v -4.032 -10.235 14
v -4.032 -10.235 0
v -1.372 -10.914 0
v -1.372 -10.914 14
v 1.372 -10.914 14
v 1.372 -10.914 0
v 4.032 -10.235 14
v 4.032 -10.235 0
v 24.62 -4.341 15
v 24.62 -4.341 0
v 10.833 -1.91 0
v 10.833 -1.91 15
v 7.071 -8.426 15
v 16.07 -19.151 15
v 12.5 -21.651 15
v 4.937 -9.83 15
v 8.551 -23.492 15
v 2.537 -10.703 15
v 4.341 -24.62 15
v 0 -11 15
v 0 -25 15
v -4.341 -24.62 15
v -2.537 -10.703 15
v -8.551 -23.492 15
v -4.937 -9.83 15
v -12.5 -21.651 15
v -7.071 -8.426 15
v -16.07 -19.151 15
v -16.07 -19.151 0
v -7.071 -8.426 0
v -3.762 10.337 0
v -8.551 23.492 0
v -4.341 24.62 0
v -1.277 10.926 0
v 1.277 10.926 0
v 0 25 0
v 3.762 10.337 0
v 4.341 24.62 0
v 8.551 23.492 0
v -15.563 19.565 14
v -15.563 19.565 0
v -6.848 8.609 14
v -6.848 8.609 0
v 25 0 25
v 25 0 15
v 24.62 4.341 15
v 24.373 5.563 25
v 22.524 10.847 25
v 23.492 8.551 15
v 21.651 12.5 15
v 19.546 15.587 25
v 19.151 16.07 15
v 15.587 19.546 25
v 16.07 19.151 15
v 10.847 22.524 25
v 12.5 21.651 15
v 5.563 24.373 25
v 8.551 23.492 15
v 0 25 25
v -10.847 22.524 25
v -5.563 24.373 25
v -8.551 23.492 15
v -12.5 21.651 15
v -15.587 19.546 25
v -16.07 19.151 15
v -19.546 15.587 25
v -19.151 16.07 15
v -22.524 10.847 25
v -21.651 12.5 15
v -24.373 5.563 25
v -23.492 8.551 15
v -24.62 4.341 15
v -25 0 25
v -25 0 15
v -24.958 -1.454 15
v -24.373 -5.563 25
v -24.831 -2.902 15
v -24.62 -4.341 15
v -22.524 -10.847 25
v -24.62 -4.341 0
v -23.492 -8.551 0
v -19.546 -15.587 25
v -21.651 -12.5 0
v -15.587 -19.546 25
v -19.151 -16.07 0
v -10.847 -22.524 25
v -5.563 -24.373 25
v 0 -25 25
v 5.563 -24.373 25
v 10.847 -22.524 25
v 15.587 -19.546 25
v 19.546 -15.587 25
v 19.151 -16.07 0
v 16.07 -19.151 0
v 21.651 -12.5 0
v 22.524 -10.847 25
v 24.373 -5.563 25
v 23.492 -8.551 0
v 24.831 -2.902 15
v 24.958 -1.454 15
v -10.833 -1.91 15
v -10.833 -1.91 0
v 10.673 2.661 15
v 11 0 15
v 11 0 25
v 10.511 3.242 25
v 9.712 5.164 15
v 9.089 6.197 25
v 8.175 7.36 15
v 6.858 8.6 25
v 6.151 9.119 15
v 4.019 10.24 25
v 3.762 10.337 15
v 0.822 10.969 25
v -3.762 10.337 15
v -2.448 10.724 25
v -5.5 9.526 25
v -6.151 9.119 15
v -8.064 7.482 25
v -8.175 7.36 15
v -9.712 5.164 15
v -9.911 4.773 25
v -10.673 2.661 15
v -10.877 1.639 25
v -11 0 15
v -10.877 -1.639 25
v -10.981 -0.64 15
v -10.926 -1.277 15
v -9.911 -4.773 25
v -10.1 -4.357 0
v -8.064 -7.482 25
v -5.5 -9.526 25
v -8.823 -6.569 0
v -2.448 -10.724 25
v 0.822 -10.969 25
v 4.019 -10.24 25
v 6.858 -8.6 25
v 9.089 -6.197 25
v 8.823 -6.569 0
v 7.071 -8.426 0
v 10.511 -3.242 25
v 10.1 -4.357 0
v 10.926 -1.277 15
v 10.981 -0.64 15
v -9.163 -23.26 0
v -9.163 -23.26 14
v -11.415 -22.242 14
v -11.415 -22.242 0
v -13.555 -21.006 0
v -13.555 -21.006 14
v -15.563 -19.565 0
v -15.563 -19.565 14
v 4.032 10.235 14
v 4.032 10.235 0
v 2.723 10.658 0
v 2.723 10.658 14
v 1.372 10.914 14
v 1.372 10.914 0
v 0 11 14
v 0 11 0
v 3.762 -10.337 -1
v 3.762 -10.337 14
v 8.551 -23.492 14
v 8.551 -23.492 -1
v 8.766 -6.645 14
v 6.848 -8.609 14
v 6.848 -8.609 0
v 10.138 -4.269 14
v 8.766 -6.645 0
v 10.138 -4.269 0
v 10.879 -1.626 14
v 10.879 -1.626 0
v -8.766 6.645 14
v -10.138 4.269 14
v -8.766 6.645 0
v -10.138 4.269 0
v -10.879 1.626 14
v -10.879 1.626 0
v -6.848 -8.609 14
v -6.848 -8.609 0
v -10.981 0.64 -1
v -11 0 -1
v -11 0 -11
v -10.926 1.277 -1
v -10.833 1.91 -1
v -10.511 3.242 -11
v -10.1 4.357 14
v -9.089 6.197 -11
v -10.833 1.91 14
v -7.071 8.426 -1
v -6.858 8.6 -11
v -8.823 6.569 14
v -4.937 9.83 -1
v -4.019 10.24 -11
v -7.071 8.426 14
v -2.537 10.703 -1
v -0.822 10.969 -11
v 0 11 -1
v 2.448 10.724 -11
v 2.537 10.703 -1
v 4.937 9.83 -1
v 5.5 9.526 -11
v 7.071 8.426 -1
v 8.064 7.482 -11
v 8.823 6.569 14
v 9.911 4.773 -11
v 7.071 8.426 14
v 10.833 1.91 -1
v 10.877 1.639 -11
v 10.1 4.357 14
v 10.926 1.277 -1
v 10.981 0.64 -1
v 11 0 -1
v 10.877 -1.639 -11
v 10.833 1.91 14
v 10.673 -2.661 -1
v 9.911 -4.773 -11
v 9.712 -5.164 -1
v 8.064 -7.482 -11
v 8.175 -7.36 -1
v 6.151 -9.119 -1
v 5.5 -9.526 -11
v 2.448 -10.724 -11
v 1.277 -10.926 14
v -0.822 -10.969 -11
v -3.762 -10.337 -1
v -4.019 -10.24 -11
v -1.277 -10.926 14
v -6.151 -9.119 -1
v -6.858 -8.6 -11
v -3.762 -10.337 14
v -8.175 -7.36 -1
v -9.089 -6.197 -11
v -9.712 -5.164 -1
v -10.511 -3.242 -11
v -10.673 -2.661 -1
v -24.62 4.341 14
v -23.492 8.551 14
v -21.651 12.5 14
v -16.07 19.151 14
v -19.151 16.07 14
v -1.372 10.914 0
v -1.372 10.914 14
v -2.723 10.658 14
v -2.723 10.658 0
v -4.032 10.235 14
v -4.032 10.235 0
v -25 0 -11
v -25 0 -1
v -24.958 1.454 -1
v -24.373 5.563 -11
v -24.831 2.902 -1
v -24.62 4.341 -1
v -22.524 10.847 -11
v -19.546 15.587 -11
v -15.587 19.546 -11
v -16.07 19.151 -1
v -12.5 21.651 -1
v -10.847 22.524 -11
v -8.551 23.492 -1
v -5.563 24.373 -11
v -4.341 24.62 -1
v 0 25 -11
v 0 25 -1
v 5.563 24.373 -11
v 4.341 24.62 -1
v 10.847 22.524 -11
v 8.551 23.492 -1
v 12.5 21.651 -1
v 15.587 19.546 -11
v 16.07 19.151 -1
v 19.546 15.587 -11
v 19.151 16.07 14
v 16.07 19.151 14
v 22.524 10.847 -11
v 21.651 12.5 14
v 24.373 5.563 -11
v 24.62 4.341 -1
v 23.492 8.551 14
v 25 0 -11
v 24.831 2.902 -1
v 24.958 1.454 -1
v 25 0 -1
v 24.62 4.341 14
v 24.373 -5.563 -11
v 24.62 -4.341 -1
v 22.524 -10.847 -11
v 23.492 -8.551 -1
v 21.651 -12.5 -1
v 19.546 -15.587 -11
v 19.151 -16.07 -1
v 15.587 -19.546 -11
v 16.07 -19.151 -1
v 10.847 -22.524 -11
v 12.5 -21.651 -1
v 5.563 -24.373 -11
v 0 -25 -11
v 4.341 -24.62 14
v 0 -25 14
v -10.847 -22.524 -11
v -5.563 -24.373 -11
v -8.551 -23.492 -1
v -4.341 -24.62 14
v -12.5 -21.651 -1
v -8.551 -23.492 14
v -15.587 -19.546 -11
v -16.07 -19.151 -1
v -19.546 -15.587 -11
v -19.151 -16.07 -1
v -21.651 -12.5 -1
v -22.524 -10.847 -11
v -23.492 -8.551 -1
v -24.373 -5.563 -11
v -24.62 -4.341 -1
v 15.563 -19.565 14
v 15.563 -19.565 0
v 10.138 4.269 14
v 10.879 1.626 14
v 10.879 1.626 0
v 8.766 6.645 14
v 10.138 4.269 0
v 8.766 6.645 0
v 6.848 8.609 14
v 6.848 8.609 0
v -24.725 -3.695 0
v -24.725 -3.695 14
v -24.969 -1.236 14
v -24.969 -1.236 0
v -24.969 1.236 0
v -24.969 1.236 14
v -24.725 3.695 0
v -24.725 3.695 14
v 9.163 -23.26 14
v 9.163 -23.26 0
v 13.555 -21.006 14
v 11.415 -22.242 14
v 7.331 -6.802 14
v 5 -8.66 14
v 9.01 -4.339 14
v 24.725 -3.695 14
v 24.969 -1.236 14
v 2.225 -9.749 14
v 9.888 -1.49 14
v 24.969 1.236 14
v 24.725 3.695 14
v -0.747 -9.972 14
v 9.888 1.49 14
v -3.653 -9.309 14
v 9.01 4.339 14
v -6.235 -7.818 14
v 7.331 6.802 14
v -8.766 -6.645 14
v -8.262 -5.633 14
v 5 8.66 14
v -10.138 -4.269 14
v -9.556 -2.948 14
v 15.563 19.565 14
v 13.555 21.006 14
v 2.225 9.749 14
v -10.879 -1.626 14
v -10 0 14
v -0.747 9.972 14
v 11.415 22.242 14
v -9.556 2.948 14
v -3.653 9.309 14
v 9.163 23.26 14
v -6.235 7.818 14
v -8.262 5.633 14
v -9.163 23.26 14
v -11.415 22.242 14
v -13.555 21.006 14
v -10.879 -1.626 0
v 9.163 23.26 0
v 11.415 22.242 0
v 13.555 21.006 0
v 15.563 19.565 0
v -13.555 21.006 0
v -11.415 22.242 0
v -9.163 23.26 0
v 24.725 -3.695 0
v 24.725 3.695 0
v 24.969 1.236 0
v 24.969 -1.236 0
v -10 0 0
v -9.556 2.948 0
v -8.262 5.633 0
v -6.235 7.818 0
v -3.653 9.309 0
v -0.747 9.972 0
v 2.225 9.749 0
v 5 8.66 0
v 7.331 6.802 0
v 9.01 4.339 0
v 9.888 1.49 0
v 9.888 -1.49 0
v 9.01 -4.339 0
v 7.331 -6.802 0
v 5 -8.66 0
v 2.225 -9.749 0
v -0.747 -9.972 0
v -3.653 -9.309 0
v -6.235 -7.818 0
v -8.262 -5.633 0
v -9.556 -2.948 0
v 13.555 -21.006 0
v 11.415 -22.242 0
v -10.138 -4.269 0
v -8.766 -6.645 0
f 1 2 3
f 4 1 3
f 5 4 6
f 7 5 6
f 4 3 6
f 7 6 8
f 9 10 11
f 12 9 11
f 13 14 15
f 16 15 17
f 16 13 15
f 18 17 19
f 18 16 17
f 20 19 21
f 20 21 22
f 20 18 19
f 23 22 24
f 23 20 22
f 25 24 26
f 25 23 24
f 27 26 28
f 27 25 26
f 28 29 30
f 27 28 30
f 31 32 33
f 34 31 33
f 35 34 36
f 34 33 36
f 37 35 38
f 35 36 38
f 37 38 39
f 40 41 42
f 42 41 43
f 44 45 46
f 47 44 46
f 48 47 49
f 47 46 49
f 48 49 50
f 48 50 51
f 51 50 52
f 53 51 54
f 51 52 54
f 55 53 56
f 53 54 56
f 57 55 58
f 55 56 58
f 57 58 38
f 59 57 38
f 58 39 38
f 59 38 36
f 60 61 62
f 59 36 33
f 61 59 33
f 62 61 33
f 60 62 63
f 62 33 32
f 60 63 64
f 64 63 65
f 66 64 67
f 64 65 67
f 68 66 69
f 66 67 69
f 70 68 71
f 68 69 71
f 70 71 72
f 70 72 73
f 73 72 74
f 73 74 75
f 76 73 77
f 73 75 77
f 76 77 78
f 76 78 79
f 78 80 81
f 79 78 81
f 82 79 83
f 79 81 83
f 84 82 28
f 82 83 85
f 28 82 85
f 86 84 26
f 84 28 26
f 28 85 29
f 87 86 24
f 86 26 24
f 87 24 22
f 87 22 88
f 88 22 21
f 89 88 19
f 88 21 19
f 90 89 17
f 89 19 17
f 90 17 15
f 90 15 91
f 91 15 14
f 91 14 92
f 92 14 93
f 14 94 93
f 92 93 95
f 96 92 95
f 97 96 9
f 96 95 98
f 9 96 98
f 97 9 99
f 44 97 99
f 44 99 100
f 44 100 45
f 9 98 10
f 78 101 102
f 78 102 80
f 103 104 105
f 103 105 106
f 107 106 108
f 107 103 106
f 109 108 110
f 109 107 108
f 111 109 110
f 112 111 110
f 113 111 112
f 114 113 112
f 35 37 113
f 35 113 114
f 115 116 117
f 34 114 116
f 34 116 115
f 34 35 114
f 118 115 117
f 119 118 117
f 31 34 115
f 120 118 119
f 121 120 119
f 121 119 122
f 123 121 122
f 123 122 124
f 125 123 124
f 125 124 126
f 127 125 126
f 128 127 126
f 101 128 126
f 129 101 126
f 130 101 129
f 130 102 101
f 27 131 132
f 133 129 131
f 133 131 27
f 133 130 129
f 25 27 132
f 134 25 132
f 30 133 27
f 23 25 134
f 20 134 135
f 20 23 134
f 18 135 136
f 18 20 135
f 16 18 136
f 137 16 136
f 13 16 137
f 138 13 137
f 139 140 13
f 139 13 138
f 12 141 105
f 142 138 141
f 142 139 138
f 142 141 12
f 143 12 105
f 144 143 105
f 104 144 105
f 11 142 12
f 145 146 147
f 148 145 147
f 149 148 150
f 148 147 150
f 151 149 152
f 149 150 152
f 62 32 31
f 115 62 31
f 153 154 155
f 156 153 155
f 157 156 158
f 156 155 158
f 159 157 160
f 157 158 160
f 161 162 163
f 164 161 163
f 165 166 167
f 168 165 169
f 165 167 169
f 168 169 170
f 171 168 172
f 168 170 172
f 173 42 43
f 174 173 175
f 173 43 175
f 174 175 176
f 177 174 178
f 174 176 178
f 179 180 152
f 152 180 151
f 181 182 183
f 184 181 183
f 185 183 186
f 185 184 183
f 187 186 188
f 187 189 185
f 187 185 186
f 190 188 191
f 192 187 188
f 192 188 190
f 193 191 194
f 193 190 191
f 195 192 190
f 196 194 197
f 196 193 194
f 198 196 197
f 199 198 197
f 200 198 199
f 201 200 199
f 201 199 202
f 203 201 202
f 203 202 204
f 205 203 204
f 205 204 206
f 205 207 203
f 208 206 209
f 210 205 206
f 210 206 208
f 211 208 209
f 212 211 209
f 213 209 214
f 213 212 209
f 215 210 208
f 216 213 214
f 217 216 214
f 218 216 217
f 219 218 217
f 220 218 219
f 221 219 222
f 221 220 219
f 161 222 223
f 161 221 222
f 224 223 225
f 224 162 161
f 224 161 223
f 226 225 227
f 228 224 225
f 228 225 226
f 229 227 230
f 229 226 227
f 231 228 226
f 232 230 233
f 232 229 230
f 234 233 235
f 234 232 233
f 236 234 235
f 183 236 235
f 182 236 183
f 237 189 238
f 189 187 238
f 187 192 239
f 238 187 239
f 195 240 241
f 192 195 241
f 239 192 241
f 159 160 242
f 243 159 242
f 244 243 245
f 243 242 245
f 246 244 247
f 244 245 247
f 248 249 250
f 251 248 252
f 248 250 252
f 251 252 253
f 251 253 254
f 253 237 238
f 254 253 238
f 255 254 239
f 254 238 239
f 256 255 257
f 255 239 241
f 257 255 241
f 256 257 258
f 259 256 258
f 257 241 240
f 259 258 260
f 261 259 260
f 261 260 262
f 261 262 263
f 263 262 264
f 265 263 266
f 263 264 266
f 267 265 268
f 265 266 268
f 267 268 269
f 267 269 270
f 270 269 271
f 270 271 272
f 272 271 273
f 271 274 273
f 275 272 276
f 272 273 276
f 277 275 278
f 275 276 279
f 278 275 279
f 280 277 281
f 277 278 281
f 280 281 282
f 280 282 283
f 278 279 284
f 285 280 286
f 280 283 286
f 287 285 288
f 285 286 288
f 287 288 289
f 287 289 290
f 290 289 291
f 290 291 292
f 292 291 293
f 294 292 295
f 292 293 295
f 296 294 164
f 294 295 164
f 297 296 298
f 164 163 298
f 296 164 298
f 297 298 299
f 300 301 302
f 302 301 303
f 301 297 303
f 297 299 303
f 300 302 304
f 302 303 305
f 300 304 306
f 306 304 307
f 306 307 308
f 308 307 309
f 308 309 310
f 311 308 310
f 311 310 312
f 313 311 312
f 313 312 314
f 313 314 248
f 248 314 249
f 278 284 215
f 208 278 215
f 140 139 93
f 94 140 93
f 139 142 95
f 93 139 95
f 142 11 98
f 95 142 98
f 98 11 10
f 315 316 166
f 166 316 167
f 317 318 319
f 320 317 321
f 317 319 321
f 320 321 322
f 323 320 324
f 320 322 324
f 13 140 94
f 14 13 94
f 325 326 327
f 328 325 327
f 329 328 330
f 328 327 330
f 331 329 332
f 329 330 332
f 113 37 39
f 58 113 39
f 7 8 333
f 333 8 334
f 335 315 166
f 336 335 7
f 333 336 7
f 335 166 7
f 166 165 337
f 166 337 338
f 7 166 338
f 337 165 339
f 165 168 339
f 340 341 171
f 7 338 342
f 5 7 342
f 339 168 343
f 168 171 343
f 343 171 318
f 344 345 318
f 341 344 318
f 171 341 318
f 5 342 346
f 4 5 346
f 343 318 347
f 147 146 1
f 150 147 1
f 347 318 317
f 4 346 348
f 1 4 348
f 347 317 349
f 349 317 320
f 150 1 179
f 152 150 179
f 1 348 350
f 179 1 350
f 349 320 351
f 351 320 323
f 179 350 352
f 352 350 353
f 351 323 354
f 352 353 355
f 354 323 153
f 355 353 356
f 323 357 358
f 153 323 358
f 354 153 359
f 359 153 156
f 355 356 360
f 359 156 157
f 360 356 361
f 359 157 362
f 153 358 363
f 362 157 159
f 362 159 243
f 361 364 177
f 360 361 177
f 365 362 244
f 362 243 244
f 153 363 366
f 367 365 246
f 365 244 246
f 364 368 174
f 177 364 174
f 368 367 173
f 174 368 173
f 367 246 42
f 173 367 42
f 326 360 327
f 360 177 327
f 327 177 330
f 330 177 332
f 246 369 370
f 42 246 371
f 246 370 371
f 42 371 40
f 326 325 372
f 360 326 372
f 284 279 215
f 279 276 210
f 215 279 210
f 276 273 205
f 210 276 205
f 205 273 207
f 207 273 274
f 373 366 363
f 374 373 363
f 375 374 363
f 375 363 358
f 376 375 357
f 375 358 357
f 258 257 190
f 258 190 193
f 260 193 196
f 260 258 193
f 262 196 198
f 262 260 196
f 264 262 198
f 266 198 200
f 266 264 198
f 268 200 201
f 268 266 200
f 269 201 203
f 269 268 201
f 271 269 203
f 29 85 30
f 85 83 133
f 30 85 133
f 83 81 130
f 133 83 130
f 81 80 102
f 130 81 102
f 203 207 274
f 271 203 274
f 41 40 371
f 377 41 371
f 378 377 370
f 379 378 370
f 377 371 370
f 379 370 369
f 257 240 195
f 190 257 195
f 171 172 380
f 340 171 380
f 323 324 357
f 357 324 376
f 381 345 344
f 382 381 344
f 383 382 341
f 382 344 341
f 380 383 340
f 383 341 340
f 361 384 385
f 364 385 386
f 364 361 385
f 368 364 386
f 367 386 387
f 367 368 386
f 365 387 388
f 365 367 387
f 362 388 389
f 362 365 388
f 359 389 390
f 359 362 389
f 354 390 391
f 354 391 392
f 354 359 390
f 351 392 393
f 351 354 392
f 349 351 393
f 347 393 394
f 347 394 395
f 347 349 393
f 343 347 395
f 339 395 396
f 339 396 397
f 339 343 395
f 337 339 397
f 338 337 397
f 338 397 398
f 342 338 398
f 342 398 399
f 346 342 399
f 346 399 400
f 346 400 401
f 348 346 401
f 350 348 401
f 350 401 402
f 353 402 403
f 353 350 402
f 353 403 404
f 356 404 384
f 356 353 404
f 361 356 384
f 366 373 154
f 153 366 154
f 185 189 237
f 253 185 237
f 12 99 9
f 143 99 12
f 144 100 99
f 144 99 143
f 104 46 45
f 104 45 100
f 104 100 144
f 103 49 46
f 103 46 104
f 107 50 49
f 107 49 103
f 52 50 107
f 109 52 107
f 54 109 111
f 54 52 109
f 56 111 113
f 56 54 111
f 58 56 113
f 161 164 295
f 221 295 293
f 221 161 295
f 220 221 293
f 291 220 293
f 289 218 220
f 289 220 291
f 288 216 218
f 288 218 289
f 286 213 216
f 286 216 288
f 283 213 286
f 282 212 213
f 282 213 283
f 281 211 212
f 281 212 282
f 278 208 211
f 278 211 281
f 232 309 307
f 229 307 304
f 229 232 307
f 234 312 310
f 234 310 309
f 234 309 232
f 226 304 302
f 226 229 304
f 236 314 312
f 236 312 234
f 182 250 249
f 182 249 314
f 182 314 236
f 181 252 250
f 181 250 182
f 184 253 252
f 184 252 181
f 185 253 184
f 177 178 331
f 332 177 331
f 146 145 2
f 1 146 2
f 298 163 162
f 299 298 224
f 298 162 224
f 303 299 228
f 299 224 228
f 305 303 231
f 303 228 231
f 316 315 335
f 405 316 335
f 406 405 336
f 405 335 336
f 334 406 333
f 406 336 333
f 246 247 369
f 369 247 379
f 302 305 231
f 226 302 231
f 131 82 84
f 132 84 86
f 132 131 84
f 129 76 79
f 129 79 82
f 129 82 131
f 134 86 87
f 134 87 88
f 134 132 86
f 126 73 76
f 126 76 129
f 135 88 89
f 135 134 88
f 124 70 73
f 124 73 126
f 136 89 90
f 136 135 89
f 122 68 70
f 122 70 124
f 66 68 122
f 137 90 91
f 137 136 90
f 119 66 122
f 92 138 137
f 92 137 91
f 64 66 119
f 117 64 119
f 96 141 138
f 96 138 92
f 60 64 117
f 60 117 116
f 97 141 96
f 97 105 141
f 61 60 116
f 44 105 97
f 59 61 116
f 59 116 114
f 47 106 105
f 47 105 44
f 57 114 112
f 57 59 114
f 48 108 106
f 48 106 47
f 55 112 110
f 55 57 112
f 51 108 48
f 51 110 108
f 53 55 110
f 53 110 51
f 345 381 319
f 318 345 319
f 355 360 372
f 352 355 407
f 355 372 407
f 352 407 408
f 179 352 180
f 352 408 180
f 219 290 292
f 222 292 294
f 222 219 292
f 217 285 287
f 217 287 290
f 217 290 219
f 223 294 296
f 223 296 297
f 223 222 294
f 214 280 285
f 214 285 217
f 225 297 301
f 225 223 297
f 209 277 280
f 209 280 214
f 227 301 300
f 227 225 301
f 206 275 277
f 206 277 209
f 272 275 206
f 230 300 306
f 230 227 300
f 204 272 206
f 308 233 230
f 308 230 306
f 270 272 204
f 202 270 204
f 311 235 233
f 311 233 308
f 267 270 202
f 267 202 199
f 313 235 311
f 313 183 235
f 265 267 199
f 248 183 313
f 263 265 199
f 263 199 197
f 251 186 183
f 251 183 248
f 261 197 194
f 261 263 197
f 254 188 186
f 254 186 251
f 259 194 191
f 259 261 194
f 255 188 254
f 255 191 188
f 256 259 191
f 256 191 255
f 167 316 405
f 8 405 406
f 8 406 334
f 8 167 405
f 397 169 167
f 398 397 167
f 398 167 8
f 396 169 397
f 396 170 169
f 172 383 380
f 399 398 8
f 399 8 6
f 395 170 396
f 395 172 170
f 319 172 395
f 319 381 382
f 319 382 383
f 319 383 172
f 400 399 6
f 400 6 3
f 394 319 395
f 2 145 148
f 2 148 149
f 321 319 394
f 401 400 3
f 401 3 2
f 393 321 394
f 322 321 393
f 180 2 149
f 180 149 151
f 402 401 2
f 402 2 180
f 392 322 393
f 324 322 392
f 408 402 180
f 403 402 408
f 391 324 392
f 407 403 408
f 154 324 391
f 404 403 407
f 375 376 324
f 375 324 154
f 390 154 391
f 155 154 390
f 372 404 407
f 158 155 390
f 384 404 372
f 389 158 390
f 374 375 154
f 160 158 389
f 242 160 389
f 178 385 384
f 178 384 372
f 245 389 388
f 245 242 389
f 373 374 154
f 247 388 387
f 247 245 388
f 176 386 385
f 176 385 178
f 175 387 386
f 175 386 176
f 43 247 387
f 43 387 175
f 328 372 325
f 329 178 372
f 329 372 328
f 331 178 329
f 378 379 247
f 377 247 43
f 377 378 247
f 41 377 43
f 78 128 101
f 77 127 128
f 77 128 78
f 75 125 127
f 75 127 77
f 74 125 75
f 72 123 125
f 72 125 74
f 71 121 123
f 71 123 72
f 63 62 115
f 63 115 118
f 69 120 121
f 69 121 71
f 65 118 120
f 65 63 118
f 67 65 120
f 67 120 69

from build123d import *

# Parameters (mm, degrees)
SKETCH_1_R          = 25
SKETCH_1_R_2        = 11
EXTRUDE_1_DEPTH     = 25
CUT_EXTRUDE_1_DEPTH = 15
SKETCH_3_R          = 25
SKETCH_3_R_2        = 11
EXTRUDE_3_DEPTH     = 25
CUT_EXTRUDE_2_DEPTH = 15
SKETCH_5_R          = 25
SKETCH_5_R_2        = 10
EXTRUDE_5_DEPTH     = 14
CUT_EXTRUDE_5_DEPTH = 14


with BuildPart() as part:
    # 草图1 → 凸台-拉伸1 (new body)
    with BuildSketch(Plane.XY):
        Circle(SKETCH_1_R)
        Circle(SKETCH_1_R_2, mode=Mode.SUBTRACT)
    extrude(amount=EXTRUDE_1_DEPTH)

    # 草图2 → 切除-拉伸1 (cut)
    with BuildSketch(Plane(origin=(0, 0, 0), x_dir=(-1, 0, 0), z_dir=(0, 0, -1))):
        with BuildLine():
            Line((-24.620193825, -4.341204442), (-10.832885283, -1.910129954))
            ThreePointArc((-10.832885283, -1.910129954), (-9.526279442, 5.5), (-3.762221577, 10.336618829))
            Line((-3.762221577, 10.336618829), (-8.550503583, 23.49231552))
            ThreePointArc((-8.550503583, 23.49231552), (-16.069690273, 19.151111052), (-21.650635135, 12.49999993))
            ThreePointArc((-21.650635135, 12.49999993), (-24.620193832, 4.341204402), (-24.620193825, -4.341204442))
        make_face()
        with BuildLine():
            Line((8.550503583, 23.49231552), (3.762221577, 10.336618829))
            ThreePointArc((3.762221577, 10.336618829), (9.010672487, 6.3093408), (11, 0))
            ThreePointArc((11, 0), (10.958141679, -0.95871317), (10.832885283, -1.910129954))
            Line((10.832885283, -1.910129954), (24.620193825, -4.341204442))
            ThreePointArc((24.620193825, -4.341204442), (24.904867452, -2.178893569), (25, 0))
            ThreePointArc((25, 0), (24.148145619, 6.470476269), (21.650634949, 12.500000253))
            ThreePointArc((21.650634949, 12.500000253), (16.06969013, 19.151111172), (8.550503583, 23.49231552))
        make_face()
        with BuildLine():
            ThreePointArc((0, -11), (-3.762221577, -10.336618829), (-7.070663707, -8.426488874))
            Line((-7.070663707, -8.426488874), (-16.069690242, -19.151111078))
            ThreePointArc((-16.069690242, -19.151111078), (-8.550503583, -23.49231552), (0, -25))
            Line((0, -25), (0, -11))
        make_face()
        with BuildLine():
            Line((16.069690242, -19.151111078), (7.070663707, -8.426488874))
            ThreePointArc((7.070663707, -8.426488874), (3.762221577, -10.336618829), (0, -11))
            Line((0, -11), (0, -25))
            ThreePointArc((0, -25), (8.550503583, -23.49231552), (16.069690242, -19.151111078))
        make_face()
    extrude(amount=-CUT_EXTRUDE_1_DEPTH, mode=Mode.SUBTRACT)


with BuildPart() as body_2:
    # 草图3 → 凸台-拉伸3 (new body)
    with BuildSketch(Plane(origin=(0, 0, 14), x_dir=(-1, 0, 0), z_dir=(0, 0, -1))):
        Circle(SKETCH_3_R)
        Circle(SKETCH_3_R_2, mode=Mode.SUBTRACT)
    extrude(amount=EXTRUDE_3_DEPTH)

    # 草图4 → 切除-拉伸2 (cut)
    with BuildSketch(Plane.XY.offset(14)):
        with BuildLine():
            Line((-16.069690242, 19.151111078), (-7.070663707, 8.426488874))
            ThreePointArc((-7.070663707, 8.426488874), (-3.762221577, 10.336618829), (0, 11))
            Line((0, 11), (0, 25))
            ThreePointArc((0, 25), (-8.550503583, 23.49231552), (-16.069690242, 19.151111078))
        make_face()
        with BuildLine():
            ThreePointArc((0, 11), (3.762221577, 10.336618829), (7.070663707, 8.426488874))
            Line((7.070663707, 8.426488874), (16.069690242, 19.151111078))
            ThreePointArc((16.069690242, 19.151111078), (8.550503583, 23.49231552), (0, 25))
            Line((0, 25), (0, 11))
        make_face()
        with BuildLine():
            Line((24.620193825, 4.341204442), (10.832885283, 1.910129954))
            ThreePointArc((10.832885283, 1.910129954), (10.958141679, 0.95871317), (11, 0))
            ThreePointArc((11, 0), (9.010672487, -6.3093408), (3.762221577, -10.336618829))
            Line((3.762221577, -10.336618829), (8.550503583, -23.49231552))
            ThreePointArc((8.550503583, -23.49231552), (16.06969013, -19.151111172), (21.650634948, -12.500000253))
            ThreePointArc((21.650634948, -12.500000253), (24.148145619, -6.470476269), (25, 0))
            ThreePointArc((25, 0), (24.904867452, 2.178893569), (24.620193825, 4.341204442))
        make_face()
        with BuildLine():
            Line((-8.550503583, -23.49231552), (-3.762221577, -10.336618829))
            ThreePointArc((-3.762221577, -10.336618829), (-9.526279442, -5.5), (-10.832885283, 1.910129954))
            Line((-10.832885283, 1.910129954), (-24.620193825, 4.341204442))
            ThreePointArc((-24.620193825, 4.341204442), (-24.620193881, -4.341204125), (-21.650635416, -12.499999443))
            ThreePointArc((-21.650635416, -12.499999443), (-16.069690489, -19.151110871), (-8.550503583, -23.49231552))
        make_face()
    extrude(amount=-CUT_EXTRUDE_2_DEPTH, mode=Mode.SUBTRACT)


with BuildPart() as body_3:
    # 草图5 → 凸台-拉伸5 (new body)
    with BuildSketch(Plane(origin=(0, 0, 14), x_dir=(-1, 0, 0), z_dir=(0, 0, -1))):
        Circle(SKETCH_5_R)
        Circle(SKETCH_5_R_2, mode=Mode.SUBTRACT)
    extrude(amount=EXTRUDE_5_DEPTH)

    # 草图6 → 切除-拉伸5 (cut)
    with BuildSketch(Plane(origin=(0, 0, 0), x_dir=(-1, 0, 0), z_dir=(0, 0, -1))):
        with BuildLine():
            Line((-24.725396584, 3.695235278), (-10.879174497, 1.625903522))
            ThreePointArc((-10.879174497, 1.625903522), (-9.526279442, 5.5), (-6.847661003, 8.608689725))
            Line((-6.847661003, 8.608689725), (-15.562865916, 19.565203921))
            ThreePointArc((-15.562865916, 19.565203921), (-18.939124752, 16.318993647), (-21.650635312, 12.499999623))
            ThreePointArc((-21.650635312, 12.499999623), (-23.602225582, 8.242265926), (-24.725396584, 3.695235278))
        make_face()
        with BuildLine():
            Line((-9.162530668, 23.2604392), (-4.031513494, 10.234593248))
            ThreePointArc((-4.031513494, 10.234593248), (-2.051764396, 10.806954375), (0, 11))
            Line((0, 11), (0, 25))
            ThreePointArc((0, 25), (-4.6631009, 24.561259943), (-9.162530668, 23.2604392))
        make_face()
        with BuildLine():
            ThreePointArc((0, 11), (2.051764396, 10.806954375), (4.031513494, 10.234593248))
            Line((4.031513494, 10.234593248), (9.162530668, 23.2604392))
            ThreePointArc((9.162530668, 23.2604392), (4.6631009, 24.561259943), (0, 25))
            Line((0, 25), (0, 11))
        make_face()
        with BuildLine():
            Line((15.562865916, 19.565203921), (6.847661003, 8.608689725))
            ThreePointArc((6.847661003, 8.608689725), (9.526279442, 5.5), (10.879174497, 1.625903522))
            Line((10.879174497, 1.625903522), (24.725396584, 3.695235278))
            ThreePointArc((24.725396584, 3.695235278), (23.60222559, 8.242265901), (21.650635338, 12.499999578))
            ThreePointArc((21.650635338, 12.499999578), (18.939124769, 16.318993627), (15.562865916, 19.565203921))
        make_face()
        with BuildLine():
            Line((24.725396584, -3.695235278), (10.879174497, -1.625903522))
            ThreePointArc((10.879174497, -1.625903522), (9.526279442, -5.5), (6.847661003, -8.608689725))
            Line((6.847661003, -8.608689725), (15.562865916, -19.565203921))
            ThreePointArc((15.562865916, -19.565203921), (18.939124491, -16.31899395), (21.650634913, -12.500000315))
            ThreePointArc((21.650634913, -12.500000315), (23.60222545, -8.242266303), (24.725396584, -3.695235278))
        make_face()
        with BuildLine():
            Line((9.162530668, -23.2604392), (4.031513494, -10.234593248))
            ThreePointArc((4.031513494, -10.234593248), (0, -11), (-4.031513494, -10.234593248))
            Line((-4.031513494, -10.234593248), (-9.162530668, -23.2604392))
            ThreePointArc((-9.162530668, -23.2604392), (-4.6631009, -24.561259943), (0, -25))
            ThreePointArc((0, -25), (4.6631009, -24.561259943), (9.162530668, -23.2604392))
        make_face()
        with BuildLine():
            Line((-15.562865916, -19.565203921), (-6.847661003, -8.608689725))
            ThreePointArc((-6.847661003, -8.608689725), (-9.526279442, -5.5), (-10.879174497, -1.625903522))
            Line((-10.879174497, -1.625903522), (-24.725396584, -3.695235278))
            ThreePointArc((-24.725396584, -3.695235278), (-23.602225599, -8.242265877), (-21.650635365, -12.499999532))
            ThreePointArc((-21.650635365, -12.499999532), (-18.939124786, -16.318993607), (-15.562865916, -19.565203921))
        make_face()
    extrude(amount=-CUT_EXTRUDE_5_DEPTH, mode=Mode.SUBTRACT)


solid = Compound([part.part, body_2.part, body_3.part])
